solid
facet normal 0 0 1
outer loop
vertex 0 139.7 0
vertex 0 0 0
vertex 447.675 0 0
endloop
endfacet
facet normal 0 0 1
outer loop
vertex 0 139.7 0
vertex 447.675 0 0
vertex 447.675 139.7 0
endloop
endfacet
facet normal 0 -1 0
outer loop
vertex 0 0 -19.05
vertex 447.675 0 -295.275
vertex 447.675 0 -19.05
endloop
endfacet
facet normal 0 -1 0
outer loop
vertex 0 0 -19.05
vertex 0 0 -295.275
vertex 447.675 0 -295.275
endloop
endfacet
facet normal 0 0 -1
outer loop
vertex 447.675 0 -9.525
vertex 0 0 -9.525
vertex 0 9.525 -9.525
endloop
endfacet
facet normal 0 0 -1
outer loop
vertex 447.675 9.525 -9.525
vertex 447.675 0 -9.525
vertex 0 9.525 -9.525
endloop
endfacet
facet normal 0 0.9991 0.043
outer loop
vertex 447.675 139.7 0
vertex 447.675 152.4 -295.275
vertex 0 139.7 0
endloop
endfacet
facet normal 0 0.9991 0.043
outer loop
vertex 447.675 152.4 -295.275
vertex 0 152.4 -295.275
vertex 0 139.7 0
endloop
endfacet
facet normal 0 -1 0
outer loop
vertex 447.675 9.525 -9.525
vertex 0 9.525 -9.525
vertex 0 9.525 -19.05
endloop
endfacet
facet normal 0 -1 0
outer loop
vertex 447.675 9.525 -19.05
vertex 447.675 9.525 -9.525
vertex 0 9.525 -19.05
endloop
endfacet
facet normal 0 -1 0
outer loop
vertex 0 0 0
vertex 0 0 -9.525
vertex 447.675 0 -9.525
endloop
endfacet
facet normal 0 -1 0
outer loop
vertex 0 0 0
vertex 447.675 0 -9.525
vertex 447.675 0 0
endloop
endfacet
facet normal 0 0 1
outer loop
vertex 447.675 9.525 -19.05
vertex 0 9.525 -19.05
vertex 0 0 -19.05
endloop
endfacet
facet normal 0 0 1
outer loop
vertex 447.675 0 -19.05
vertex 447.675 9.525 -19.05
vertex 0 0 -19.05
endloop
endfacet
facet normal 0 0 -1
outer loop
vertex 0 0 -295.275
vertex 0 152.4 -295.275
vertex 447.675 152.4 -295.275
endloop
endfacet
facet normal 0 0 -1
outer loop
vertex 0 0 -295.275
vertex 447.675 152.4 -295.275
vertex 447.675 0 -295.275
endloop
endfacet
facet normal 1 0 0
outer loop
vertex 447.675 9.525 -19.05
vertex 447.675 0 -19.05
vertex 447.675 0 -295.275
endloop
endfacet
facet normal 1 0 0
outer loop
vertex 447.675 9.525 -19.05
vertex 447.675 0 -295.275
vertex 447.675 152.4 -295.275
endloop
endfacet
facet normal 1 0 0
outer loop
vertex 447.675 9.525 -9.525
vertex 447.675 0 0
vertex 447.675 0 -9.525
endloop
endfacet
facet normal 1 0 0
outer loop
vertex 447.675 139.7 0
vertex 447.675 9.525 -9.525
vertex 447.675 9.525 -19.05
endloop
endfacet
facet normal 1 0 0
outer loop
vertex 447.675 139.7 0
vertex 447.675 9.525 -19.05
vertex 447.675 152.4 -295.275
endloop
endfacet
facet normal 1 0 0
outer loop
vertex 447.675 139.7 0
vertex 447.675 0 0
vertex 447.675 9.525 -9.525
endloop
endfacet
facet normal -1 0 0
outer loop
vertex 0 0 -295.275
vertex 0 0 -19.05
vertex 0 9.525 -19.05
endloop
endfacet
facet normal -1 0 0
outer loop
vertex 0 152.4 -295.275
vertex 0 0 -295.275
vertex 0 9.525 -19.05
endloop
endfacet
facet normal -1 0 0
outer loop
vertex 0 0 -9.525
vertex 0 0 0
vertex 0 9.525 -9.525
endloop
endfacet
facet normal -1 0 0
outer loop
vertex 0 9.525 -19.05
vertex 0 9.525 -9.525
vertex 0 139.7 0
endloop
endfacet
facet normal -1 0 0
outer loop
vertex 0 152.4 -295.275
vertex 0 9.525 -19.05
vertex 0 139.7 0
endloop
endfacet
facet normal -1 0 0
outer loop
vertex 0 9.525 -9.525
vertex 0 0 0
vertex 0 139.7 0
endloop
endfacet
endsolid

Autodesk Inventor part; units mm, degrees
ref_plane "YZ Plane" through (0, 0, 0) normal (1, 0, 0) x (0, 1, 0)
ref_plane "XZ Plane" through (0, 0, 0) normal (0, 1, 0) x (-1, 0, 0)
ref_plane "XY Plane" through (0, 0, 0) normal (0, 0, 1) x (1, 0, 0)
sketch "Sketch1" plane through (0, 0, 0) normal (1, 0, 0) x (0, 1, 0)
  line L0 (0, 0) -> (152.4, 0)
  line L1 (152.4, 0) -> (152.4, -295.275)
  line L2 (152.4, -295.275) -> (0, -295.275)
  line L3 (0, -295.275) -> (0, 0)
  line L4 (152.4, -295.275) -> (139.7, 0)
  line L5 (0, -9.525) -> (9.525, -9.525)
  line L6 (9.525, -9.525) -> (9.525, -19.05)
  line L7 (9.525, -19.05) -> (0, -19.05)
  line L8 (0, -19.05) -> (0, -9.525)
  point P0 (0, -19.05)
  dimension "d0" = 152.4
  dimension "d1" = 295.275
  dimension "d2" = 12.7
  dimension "d3" = 9.525
  dimension "d4" = 9.525
  dimension "d5" = 9.525
extrude "Extrusion1" add sketch "Sketch1" along normal blind 447.675 contours L0 L4 L2 L3 L7 L6 L5
equation "\"d5\" = d3"
